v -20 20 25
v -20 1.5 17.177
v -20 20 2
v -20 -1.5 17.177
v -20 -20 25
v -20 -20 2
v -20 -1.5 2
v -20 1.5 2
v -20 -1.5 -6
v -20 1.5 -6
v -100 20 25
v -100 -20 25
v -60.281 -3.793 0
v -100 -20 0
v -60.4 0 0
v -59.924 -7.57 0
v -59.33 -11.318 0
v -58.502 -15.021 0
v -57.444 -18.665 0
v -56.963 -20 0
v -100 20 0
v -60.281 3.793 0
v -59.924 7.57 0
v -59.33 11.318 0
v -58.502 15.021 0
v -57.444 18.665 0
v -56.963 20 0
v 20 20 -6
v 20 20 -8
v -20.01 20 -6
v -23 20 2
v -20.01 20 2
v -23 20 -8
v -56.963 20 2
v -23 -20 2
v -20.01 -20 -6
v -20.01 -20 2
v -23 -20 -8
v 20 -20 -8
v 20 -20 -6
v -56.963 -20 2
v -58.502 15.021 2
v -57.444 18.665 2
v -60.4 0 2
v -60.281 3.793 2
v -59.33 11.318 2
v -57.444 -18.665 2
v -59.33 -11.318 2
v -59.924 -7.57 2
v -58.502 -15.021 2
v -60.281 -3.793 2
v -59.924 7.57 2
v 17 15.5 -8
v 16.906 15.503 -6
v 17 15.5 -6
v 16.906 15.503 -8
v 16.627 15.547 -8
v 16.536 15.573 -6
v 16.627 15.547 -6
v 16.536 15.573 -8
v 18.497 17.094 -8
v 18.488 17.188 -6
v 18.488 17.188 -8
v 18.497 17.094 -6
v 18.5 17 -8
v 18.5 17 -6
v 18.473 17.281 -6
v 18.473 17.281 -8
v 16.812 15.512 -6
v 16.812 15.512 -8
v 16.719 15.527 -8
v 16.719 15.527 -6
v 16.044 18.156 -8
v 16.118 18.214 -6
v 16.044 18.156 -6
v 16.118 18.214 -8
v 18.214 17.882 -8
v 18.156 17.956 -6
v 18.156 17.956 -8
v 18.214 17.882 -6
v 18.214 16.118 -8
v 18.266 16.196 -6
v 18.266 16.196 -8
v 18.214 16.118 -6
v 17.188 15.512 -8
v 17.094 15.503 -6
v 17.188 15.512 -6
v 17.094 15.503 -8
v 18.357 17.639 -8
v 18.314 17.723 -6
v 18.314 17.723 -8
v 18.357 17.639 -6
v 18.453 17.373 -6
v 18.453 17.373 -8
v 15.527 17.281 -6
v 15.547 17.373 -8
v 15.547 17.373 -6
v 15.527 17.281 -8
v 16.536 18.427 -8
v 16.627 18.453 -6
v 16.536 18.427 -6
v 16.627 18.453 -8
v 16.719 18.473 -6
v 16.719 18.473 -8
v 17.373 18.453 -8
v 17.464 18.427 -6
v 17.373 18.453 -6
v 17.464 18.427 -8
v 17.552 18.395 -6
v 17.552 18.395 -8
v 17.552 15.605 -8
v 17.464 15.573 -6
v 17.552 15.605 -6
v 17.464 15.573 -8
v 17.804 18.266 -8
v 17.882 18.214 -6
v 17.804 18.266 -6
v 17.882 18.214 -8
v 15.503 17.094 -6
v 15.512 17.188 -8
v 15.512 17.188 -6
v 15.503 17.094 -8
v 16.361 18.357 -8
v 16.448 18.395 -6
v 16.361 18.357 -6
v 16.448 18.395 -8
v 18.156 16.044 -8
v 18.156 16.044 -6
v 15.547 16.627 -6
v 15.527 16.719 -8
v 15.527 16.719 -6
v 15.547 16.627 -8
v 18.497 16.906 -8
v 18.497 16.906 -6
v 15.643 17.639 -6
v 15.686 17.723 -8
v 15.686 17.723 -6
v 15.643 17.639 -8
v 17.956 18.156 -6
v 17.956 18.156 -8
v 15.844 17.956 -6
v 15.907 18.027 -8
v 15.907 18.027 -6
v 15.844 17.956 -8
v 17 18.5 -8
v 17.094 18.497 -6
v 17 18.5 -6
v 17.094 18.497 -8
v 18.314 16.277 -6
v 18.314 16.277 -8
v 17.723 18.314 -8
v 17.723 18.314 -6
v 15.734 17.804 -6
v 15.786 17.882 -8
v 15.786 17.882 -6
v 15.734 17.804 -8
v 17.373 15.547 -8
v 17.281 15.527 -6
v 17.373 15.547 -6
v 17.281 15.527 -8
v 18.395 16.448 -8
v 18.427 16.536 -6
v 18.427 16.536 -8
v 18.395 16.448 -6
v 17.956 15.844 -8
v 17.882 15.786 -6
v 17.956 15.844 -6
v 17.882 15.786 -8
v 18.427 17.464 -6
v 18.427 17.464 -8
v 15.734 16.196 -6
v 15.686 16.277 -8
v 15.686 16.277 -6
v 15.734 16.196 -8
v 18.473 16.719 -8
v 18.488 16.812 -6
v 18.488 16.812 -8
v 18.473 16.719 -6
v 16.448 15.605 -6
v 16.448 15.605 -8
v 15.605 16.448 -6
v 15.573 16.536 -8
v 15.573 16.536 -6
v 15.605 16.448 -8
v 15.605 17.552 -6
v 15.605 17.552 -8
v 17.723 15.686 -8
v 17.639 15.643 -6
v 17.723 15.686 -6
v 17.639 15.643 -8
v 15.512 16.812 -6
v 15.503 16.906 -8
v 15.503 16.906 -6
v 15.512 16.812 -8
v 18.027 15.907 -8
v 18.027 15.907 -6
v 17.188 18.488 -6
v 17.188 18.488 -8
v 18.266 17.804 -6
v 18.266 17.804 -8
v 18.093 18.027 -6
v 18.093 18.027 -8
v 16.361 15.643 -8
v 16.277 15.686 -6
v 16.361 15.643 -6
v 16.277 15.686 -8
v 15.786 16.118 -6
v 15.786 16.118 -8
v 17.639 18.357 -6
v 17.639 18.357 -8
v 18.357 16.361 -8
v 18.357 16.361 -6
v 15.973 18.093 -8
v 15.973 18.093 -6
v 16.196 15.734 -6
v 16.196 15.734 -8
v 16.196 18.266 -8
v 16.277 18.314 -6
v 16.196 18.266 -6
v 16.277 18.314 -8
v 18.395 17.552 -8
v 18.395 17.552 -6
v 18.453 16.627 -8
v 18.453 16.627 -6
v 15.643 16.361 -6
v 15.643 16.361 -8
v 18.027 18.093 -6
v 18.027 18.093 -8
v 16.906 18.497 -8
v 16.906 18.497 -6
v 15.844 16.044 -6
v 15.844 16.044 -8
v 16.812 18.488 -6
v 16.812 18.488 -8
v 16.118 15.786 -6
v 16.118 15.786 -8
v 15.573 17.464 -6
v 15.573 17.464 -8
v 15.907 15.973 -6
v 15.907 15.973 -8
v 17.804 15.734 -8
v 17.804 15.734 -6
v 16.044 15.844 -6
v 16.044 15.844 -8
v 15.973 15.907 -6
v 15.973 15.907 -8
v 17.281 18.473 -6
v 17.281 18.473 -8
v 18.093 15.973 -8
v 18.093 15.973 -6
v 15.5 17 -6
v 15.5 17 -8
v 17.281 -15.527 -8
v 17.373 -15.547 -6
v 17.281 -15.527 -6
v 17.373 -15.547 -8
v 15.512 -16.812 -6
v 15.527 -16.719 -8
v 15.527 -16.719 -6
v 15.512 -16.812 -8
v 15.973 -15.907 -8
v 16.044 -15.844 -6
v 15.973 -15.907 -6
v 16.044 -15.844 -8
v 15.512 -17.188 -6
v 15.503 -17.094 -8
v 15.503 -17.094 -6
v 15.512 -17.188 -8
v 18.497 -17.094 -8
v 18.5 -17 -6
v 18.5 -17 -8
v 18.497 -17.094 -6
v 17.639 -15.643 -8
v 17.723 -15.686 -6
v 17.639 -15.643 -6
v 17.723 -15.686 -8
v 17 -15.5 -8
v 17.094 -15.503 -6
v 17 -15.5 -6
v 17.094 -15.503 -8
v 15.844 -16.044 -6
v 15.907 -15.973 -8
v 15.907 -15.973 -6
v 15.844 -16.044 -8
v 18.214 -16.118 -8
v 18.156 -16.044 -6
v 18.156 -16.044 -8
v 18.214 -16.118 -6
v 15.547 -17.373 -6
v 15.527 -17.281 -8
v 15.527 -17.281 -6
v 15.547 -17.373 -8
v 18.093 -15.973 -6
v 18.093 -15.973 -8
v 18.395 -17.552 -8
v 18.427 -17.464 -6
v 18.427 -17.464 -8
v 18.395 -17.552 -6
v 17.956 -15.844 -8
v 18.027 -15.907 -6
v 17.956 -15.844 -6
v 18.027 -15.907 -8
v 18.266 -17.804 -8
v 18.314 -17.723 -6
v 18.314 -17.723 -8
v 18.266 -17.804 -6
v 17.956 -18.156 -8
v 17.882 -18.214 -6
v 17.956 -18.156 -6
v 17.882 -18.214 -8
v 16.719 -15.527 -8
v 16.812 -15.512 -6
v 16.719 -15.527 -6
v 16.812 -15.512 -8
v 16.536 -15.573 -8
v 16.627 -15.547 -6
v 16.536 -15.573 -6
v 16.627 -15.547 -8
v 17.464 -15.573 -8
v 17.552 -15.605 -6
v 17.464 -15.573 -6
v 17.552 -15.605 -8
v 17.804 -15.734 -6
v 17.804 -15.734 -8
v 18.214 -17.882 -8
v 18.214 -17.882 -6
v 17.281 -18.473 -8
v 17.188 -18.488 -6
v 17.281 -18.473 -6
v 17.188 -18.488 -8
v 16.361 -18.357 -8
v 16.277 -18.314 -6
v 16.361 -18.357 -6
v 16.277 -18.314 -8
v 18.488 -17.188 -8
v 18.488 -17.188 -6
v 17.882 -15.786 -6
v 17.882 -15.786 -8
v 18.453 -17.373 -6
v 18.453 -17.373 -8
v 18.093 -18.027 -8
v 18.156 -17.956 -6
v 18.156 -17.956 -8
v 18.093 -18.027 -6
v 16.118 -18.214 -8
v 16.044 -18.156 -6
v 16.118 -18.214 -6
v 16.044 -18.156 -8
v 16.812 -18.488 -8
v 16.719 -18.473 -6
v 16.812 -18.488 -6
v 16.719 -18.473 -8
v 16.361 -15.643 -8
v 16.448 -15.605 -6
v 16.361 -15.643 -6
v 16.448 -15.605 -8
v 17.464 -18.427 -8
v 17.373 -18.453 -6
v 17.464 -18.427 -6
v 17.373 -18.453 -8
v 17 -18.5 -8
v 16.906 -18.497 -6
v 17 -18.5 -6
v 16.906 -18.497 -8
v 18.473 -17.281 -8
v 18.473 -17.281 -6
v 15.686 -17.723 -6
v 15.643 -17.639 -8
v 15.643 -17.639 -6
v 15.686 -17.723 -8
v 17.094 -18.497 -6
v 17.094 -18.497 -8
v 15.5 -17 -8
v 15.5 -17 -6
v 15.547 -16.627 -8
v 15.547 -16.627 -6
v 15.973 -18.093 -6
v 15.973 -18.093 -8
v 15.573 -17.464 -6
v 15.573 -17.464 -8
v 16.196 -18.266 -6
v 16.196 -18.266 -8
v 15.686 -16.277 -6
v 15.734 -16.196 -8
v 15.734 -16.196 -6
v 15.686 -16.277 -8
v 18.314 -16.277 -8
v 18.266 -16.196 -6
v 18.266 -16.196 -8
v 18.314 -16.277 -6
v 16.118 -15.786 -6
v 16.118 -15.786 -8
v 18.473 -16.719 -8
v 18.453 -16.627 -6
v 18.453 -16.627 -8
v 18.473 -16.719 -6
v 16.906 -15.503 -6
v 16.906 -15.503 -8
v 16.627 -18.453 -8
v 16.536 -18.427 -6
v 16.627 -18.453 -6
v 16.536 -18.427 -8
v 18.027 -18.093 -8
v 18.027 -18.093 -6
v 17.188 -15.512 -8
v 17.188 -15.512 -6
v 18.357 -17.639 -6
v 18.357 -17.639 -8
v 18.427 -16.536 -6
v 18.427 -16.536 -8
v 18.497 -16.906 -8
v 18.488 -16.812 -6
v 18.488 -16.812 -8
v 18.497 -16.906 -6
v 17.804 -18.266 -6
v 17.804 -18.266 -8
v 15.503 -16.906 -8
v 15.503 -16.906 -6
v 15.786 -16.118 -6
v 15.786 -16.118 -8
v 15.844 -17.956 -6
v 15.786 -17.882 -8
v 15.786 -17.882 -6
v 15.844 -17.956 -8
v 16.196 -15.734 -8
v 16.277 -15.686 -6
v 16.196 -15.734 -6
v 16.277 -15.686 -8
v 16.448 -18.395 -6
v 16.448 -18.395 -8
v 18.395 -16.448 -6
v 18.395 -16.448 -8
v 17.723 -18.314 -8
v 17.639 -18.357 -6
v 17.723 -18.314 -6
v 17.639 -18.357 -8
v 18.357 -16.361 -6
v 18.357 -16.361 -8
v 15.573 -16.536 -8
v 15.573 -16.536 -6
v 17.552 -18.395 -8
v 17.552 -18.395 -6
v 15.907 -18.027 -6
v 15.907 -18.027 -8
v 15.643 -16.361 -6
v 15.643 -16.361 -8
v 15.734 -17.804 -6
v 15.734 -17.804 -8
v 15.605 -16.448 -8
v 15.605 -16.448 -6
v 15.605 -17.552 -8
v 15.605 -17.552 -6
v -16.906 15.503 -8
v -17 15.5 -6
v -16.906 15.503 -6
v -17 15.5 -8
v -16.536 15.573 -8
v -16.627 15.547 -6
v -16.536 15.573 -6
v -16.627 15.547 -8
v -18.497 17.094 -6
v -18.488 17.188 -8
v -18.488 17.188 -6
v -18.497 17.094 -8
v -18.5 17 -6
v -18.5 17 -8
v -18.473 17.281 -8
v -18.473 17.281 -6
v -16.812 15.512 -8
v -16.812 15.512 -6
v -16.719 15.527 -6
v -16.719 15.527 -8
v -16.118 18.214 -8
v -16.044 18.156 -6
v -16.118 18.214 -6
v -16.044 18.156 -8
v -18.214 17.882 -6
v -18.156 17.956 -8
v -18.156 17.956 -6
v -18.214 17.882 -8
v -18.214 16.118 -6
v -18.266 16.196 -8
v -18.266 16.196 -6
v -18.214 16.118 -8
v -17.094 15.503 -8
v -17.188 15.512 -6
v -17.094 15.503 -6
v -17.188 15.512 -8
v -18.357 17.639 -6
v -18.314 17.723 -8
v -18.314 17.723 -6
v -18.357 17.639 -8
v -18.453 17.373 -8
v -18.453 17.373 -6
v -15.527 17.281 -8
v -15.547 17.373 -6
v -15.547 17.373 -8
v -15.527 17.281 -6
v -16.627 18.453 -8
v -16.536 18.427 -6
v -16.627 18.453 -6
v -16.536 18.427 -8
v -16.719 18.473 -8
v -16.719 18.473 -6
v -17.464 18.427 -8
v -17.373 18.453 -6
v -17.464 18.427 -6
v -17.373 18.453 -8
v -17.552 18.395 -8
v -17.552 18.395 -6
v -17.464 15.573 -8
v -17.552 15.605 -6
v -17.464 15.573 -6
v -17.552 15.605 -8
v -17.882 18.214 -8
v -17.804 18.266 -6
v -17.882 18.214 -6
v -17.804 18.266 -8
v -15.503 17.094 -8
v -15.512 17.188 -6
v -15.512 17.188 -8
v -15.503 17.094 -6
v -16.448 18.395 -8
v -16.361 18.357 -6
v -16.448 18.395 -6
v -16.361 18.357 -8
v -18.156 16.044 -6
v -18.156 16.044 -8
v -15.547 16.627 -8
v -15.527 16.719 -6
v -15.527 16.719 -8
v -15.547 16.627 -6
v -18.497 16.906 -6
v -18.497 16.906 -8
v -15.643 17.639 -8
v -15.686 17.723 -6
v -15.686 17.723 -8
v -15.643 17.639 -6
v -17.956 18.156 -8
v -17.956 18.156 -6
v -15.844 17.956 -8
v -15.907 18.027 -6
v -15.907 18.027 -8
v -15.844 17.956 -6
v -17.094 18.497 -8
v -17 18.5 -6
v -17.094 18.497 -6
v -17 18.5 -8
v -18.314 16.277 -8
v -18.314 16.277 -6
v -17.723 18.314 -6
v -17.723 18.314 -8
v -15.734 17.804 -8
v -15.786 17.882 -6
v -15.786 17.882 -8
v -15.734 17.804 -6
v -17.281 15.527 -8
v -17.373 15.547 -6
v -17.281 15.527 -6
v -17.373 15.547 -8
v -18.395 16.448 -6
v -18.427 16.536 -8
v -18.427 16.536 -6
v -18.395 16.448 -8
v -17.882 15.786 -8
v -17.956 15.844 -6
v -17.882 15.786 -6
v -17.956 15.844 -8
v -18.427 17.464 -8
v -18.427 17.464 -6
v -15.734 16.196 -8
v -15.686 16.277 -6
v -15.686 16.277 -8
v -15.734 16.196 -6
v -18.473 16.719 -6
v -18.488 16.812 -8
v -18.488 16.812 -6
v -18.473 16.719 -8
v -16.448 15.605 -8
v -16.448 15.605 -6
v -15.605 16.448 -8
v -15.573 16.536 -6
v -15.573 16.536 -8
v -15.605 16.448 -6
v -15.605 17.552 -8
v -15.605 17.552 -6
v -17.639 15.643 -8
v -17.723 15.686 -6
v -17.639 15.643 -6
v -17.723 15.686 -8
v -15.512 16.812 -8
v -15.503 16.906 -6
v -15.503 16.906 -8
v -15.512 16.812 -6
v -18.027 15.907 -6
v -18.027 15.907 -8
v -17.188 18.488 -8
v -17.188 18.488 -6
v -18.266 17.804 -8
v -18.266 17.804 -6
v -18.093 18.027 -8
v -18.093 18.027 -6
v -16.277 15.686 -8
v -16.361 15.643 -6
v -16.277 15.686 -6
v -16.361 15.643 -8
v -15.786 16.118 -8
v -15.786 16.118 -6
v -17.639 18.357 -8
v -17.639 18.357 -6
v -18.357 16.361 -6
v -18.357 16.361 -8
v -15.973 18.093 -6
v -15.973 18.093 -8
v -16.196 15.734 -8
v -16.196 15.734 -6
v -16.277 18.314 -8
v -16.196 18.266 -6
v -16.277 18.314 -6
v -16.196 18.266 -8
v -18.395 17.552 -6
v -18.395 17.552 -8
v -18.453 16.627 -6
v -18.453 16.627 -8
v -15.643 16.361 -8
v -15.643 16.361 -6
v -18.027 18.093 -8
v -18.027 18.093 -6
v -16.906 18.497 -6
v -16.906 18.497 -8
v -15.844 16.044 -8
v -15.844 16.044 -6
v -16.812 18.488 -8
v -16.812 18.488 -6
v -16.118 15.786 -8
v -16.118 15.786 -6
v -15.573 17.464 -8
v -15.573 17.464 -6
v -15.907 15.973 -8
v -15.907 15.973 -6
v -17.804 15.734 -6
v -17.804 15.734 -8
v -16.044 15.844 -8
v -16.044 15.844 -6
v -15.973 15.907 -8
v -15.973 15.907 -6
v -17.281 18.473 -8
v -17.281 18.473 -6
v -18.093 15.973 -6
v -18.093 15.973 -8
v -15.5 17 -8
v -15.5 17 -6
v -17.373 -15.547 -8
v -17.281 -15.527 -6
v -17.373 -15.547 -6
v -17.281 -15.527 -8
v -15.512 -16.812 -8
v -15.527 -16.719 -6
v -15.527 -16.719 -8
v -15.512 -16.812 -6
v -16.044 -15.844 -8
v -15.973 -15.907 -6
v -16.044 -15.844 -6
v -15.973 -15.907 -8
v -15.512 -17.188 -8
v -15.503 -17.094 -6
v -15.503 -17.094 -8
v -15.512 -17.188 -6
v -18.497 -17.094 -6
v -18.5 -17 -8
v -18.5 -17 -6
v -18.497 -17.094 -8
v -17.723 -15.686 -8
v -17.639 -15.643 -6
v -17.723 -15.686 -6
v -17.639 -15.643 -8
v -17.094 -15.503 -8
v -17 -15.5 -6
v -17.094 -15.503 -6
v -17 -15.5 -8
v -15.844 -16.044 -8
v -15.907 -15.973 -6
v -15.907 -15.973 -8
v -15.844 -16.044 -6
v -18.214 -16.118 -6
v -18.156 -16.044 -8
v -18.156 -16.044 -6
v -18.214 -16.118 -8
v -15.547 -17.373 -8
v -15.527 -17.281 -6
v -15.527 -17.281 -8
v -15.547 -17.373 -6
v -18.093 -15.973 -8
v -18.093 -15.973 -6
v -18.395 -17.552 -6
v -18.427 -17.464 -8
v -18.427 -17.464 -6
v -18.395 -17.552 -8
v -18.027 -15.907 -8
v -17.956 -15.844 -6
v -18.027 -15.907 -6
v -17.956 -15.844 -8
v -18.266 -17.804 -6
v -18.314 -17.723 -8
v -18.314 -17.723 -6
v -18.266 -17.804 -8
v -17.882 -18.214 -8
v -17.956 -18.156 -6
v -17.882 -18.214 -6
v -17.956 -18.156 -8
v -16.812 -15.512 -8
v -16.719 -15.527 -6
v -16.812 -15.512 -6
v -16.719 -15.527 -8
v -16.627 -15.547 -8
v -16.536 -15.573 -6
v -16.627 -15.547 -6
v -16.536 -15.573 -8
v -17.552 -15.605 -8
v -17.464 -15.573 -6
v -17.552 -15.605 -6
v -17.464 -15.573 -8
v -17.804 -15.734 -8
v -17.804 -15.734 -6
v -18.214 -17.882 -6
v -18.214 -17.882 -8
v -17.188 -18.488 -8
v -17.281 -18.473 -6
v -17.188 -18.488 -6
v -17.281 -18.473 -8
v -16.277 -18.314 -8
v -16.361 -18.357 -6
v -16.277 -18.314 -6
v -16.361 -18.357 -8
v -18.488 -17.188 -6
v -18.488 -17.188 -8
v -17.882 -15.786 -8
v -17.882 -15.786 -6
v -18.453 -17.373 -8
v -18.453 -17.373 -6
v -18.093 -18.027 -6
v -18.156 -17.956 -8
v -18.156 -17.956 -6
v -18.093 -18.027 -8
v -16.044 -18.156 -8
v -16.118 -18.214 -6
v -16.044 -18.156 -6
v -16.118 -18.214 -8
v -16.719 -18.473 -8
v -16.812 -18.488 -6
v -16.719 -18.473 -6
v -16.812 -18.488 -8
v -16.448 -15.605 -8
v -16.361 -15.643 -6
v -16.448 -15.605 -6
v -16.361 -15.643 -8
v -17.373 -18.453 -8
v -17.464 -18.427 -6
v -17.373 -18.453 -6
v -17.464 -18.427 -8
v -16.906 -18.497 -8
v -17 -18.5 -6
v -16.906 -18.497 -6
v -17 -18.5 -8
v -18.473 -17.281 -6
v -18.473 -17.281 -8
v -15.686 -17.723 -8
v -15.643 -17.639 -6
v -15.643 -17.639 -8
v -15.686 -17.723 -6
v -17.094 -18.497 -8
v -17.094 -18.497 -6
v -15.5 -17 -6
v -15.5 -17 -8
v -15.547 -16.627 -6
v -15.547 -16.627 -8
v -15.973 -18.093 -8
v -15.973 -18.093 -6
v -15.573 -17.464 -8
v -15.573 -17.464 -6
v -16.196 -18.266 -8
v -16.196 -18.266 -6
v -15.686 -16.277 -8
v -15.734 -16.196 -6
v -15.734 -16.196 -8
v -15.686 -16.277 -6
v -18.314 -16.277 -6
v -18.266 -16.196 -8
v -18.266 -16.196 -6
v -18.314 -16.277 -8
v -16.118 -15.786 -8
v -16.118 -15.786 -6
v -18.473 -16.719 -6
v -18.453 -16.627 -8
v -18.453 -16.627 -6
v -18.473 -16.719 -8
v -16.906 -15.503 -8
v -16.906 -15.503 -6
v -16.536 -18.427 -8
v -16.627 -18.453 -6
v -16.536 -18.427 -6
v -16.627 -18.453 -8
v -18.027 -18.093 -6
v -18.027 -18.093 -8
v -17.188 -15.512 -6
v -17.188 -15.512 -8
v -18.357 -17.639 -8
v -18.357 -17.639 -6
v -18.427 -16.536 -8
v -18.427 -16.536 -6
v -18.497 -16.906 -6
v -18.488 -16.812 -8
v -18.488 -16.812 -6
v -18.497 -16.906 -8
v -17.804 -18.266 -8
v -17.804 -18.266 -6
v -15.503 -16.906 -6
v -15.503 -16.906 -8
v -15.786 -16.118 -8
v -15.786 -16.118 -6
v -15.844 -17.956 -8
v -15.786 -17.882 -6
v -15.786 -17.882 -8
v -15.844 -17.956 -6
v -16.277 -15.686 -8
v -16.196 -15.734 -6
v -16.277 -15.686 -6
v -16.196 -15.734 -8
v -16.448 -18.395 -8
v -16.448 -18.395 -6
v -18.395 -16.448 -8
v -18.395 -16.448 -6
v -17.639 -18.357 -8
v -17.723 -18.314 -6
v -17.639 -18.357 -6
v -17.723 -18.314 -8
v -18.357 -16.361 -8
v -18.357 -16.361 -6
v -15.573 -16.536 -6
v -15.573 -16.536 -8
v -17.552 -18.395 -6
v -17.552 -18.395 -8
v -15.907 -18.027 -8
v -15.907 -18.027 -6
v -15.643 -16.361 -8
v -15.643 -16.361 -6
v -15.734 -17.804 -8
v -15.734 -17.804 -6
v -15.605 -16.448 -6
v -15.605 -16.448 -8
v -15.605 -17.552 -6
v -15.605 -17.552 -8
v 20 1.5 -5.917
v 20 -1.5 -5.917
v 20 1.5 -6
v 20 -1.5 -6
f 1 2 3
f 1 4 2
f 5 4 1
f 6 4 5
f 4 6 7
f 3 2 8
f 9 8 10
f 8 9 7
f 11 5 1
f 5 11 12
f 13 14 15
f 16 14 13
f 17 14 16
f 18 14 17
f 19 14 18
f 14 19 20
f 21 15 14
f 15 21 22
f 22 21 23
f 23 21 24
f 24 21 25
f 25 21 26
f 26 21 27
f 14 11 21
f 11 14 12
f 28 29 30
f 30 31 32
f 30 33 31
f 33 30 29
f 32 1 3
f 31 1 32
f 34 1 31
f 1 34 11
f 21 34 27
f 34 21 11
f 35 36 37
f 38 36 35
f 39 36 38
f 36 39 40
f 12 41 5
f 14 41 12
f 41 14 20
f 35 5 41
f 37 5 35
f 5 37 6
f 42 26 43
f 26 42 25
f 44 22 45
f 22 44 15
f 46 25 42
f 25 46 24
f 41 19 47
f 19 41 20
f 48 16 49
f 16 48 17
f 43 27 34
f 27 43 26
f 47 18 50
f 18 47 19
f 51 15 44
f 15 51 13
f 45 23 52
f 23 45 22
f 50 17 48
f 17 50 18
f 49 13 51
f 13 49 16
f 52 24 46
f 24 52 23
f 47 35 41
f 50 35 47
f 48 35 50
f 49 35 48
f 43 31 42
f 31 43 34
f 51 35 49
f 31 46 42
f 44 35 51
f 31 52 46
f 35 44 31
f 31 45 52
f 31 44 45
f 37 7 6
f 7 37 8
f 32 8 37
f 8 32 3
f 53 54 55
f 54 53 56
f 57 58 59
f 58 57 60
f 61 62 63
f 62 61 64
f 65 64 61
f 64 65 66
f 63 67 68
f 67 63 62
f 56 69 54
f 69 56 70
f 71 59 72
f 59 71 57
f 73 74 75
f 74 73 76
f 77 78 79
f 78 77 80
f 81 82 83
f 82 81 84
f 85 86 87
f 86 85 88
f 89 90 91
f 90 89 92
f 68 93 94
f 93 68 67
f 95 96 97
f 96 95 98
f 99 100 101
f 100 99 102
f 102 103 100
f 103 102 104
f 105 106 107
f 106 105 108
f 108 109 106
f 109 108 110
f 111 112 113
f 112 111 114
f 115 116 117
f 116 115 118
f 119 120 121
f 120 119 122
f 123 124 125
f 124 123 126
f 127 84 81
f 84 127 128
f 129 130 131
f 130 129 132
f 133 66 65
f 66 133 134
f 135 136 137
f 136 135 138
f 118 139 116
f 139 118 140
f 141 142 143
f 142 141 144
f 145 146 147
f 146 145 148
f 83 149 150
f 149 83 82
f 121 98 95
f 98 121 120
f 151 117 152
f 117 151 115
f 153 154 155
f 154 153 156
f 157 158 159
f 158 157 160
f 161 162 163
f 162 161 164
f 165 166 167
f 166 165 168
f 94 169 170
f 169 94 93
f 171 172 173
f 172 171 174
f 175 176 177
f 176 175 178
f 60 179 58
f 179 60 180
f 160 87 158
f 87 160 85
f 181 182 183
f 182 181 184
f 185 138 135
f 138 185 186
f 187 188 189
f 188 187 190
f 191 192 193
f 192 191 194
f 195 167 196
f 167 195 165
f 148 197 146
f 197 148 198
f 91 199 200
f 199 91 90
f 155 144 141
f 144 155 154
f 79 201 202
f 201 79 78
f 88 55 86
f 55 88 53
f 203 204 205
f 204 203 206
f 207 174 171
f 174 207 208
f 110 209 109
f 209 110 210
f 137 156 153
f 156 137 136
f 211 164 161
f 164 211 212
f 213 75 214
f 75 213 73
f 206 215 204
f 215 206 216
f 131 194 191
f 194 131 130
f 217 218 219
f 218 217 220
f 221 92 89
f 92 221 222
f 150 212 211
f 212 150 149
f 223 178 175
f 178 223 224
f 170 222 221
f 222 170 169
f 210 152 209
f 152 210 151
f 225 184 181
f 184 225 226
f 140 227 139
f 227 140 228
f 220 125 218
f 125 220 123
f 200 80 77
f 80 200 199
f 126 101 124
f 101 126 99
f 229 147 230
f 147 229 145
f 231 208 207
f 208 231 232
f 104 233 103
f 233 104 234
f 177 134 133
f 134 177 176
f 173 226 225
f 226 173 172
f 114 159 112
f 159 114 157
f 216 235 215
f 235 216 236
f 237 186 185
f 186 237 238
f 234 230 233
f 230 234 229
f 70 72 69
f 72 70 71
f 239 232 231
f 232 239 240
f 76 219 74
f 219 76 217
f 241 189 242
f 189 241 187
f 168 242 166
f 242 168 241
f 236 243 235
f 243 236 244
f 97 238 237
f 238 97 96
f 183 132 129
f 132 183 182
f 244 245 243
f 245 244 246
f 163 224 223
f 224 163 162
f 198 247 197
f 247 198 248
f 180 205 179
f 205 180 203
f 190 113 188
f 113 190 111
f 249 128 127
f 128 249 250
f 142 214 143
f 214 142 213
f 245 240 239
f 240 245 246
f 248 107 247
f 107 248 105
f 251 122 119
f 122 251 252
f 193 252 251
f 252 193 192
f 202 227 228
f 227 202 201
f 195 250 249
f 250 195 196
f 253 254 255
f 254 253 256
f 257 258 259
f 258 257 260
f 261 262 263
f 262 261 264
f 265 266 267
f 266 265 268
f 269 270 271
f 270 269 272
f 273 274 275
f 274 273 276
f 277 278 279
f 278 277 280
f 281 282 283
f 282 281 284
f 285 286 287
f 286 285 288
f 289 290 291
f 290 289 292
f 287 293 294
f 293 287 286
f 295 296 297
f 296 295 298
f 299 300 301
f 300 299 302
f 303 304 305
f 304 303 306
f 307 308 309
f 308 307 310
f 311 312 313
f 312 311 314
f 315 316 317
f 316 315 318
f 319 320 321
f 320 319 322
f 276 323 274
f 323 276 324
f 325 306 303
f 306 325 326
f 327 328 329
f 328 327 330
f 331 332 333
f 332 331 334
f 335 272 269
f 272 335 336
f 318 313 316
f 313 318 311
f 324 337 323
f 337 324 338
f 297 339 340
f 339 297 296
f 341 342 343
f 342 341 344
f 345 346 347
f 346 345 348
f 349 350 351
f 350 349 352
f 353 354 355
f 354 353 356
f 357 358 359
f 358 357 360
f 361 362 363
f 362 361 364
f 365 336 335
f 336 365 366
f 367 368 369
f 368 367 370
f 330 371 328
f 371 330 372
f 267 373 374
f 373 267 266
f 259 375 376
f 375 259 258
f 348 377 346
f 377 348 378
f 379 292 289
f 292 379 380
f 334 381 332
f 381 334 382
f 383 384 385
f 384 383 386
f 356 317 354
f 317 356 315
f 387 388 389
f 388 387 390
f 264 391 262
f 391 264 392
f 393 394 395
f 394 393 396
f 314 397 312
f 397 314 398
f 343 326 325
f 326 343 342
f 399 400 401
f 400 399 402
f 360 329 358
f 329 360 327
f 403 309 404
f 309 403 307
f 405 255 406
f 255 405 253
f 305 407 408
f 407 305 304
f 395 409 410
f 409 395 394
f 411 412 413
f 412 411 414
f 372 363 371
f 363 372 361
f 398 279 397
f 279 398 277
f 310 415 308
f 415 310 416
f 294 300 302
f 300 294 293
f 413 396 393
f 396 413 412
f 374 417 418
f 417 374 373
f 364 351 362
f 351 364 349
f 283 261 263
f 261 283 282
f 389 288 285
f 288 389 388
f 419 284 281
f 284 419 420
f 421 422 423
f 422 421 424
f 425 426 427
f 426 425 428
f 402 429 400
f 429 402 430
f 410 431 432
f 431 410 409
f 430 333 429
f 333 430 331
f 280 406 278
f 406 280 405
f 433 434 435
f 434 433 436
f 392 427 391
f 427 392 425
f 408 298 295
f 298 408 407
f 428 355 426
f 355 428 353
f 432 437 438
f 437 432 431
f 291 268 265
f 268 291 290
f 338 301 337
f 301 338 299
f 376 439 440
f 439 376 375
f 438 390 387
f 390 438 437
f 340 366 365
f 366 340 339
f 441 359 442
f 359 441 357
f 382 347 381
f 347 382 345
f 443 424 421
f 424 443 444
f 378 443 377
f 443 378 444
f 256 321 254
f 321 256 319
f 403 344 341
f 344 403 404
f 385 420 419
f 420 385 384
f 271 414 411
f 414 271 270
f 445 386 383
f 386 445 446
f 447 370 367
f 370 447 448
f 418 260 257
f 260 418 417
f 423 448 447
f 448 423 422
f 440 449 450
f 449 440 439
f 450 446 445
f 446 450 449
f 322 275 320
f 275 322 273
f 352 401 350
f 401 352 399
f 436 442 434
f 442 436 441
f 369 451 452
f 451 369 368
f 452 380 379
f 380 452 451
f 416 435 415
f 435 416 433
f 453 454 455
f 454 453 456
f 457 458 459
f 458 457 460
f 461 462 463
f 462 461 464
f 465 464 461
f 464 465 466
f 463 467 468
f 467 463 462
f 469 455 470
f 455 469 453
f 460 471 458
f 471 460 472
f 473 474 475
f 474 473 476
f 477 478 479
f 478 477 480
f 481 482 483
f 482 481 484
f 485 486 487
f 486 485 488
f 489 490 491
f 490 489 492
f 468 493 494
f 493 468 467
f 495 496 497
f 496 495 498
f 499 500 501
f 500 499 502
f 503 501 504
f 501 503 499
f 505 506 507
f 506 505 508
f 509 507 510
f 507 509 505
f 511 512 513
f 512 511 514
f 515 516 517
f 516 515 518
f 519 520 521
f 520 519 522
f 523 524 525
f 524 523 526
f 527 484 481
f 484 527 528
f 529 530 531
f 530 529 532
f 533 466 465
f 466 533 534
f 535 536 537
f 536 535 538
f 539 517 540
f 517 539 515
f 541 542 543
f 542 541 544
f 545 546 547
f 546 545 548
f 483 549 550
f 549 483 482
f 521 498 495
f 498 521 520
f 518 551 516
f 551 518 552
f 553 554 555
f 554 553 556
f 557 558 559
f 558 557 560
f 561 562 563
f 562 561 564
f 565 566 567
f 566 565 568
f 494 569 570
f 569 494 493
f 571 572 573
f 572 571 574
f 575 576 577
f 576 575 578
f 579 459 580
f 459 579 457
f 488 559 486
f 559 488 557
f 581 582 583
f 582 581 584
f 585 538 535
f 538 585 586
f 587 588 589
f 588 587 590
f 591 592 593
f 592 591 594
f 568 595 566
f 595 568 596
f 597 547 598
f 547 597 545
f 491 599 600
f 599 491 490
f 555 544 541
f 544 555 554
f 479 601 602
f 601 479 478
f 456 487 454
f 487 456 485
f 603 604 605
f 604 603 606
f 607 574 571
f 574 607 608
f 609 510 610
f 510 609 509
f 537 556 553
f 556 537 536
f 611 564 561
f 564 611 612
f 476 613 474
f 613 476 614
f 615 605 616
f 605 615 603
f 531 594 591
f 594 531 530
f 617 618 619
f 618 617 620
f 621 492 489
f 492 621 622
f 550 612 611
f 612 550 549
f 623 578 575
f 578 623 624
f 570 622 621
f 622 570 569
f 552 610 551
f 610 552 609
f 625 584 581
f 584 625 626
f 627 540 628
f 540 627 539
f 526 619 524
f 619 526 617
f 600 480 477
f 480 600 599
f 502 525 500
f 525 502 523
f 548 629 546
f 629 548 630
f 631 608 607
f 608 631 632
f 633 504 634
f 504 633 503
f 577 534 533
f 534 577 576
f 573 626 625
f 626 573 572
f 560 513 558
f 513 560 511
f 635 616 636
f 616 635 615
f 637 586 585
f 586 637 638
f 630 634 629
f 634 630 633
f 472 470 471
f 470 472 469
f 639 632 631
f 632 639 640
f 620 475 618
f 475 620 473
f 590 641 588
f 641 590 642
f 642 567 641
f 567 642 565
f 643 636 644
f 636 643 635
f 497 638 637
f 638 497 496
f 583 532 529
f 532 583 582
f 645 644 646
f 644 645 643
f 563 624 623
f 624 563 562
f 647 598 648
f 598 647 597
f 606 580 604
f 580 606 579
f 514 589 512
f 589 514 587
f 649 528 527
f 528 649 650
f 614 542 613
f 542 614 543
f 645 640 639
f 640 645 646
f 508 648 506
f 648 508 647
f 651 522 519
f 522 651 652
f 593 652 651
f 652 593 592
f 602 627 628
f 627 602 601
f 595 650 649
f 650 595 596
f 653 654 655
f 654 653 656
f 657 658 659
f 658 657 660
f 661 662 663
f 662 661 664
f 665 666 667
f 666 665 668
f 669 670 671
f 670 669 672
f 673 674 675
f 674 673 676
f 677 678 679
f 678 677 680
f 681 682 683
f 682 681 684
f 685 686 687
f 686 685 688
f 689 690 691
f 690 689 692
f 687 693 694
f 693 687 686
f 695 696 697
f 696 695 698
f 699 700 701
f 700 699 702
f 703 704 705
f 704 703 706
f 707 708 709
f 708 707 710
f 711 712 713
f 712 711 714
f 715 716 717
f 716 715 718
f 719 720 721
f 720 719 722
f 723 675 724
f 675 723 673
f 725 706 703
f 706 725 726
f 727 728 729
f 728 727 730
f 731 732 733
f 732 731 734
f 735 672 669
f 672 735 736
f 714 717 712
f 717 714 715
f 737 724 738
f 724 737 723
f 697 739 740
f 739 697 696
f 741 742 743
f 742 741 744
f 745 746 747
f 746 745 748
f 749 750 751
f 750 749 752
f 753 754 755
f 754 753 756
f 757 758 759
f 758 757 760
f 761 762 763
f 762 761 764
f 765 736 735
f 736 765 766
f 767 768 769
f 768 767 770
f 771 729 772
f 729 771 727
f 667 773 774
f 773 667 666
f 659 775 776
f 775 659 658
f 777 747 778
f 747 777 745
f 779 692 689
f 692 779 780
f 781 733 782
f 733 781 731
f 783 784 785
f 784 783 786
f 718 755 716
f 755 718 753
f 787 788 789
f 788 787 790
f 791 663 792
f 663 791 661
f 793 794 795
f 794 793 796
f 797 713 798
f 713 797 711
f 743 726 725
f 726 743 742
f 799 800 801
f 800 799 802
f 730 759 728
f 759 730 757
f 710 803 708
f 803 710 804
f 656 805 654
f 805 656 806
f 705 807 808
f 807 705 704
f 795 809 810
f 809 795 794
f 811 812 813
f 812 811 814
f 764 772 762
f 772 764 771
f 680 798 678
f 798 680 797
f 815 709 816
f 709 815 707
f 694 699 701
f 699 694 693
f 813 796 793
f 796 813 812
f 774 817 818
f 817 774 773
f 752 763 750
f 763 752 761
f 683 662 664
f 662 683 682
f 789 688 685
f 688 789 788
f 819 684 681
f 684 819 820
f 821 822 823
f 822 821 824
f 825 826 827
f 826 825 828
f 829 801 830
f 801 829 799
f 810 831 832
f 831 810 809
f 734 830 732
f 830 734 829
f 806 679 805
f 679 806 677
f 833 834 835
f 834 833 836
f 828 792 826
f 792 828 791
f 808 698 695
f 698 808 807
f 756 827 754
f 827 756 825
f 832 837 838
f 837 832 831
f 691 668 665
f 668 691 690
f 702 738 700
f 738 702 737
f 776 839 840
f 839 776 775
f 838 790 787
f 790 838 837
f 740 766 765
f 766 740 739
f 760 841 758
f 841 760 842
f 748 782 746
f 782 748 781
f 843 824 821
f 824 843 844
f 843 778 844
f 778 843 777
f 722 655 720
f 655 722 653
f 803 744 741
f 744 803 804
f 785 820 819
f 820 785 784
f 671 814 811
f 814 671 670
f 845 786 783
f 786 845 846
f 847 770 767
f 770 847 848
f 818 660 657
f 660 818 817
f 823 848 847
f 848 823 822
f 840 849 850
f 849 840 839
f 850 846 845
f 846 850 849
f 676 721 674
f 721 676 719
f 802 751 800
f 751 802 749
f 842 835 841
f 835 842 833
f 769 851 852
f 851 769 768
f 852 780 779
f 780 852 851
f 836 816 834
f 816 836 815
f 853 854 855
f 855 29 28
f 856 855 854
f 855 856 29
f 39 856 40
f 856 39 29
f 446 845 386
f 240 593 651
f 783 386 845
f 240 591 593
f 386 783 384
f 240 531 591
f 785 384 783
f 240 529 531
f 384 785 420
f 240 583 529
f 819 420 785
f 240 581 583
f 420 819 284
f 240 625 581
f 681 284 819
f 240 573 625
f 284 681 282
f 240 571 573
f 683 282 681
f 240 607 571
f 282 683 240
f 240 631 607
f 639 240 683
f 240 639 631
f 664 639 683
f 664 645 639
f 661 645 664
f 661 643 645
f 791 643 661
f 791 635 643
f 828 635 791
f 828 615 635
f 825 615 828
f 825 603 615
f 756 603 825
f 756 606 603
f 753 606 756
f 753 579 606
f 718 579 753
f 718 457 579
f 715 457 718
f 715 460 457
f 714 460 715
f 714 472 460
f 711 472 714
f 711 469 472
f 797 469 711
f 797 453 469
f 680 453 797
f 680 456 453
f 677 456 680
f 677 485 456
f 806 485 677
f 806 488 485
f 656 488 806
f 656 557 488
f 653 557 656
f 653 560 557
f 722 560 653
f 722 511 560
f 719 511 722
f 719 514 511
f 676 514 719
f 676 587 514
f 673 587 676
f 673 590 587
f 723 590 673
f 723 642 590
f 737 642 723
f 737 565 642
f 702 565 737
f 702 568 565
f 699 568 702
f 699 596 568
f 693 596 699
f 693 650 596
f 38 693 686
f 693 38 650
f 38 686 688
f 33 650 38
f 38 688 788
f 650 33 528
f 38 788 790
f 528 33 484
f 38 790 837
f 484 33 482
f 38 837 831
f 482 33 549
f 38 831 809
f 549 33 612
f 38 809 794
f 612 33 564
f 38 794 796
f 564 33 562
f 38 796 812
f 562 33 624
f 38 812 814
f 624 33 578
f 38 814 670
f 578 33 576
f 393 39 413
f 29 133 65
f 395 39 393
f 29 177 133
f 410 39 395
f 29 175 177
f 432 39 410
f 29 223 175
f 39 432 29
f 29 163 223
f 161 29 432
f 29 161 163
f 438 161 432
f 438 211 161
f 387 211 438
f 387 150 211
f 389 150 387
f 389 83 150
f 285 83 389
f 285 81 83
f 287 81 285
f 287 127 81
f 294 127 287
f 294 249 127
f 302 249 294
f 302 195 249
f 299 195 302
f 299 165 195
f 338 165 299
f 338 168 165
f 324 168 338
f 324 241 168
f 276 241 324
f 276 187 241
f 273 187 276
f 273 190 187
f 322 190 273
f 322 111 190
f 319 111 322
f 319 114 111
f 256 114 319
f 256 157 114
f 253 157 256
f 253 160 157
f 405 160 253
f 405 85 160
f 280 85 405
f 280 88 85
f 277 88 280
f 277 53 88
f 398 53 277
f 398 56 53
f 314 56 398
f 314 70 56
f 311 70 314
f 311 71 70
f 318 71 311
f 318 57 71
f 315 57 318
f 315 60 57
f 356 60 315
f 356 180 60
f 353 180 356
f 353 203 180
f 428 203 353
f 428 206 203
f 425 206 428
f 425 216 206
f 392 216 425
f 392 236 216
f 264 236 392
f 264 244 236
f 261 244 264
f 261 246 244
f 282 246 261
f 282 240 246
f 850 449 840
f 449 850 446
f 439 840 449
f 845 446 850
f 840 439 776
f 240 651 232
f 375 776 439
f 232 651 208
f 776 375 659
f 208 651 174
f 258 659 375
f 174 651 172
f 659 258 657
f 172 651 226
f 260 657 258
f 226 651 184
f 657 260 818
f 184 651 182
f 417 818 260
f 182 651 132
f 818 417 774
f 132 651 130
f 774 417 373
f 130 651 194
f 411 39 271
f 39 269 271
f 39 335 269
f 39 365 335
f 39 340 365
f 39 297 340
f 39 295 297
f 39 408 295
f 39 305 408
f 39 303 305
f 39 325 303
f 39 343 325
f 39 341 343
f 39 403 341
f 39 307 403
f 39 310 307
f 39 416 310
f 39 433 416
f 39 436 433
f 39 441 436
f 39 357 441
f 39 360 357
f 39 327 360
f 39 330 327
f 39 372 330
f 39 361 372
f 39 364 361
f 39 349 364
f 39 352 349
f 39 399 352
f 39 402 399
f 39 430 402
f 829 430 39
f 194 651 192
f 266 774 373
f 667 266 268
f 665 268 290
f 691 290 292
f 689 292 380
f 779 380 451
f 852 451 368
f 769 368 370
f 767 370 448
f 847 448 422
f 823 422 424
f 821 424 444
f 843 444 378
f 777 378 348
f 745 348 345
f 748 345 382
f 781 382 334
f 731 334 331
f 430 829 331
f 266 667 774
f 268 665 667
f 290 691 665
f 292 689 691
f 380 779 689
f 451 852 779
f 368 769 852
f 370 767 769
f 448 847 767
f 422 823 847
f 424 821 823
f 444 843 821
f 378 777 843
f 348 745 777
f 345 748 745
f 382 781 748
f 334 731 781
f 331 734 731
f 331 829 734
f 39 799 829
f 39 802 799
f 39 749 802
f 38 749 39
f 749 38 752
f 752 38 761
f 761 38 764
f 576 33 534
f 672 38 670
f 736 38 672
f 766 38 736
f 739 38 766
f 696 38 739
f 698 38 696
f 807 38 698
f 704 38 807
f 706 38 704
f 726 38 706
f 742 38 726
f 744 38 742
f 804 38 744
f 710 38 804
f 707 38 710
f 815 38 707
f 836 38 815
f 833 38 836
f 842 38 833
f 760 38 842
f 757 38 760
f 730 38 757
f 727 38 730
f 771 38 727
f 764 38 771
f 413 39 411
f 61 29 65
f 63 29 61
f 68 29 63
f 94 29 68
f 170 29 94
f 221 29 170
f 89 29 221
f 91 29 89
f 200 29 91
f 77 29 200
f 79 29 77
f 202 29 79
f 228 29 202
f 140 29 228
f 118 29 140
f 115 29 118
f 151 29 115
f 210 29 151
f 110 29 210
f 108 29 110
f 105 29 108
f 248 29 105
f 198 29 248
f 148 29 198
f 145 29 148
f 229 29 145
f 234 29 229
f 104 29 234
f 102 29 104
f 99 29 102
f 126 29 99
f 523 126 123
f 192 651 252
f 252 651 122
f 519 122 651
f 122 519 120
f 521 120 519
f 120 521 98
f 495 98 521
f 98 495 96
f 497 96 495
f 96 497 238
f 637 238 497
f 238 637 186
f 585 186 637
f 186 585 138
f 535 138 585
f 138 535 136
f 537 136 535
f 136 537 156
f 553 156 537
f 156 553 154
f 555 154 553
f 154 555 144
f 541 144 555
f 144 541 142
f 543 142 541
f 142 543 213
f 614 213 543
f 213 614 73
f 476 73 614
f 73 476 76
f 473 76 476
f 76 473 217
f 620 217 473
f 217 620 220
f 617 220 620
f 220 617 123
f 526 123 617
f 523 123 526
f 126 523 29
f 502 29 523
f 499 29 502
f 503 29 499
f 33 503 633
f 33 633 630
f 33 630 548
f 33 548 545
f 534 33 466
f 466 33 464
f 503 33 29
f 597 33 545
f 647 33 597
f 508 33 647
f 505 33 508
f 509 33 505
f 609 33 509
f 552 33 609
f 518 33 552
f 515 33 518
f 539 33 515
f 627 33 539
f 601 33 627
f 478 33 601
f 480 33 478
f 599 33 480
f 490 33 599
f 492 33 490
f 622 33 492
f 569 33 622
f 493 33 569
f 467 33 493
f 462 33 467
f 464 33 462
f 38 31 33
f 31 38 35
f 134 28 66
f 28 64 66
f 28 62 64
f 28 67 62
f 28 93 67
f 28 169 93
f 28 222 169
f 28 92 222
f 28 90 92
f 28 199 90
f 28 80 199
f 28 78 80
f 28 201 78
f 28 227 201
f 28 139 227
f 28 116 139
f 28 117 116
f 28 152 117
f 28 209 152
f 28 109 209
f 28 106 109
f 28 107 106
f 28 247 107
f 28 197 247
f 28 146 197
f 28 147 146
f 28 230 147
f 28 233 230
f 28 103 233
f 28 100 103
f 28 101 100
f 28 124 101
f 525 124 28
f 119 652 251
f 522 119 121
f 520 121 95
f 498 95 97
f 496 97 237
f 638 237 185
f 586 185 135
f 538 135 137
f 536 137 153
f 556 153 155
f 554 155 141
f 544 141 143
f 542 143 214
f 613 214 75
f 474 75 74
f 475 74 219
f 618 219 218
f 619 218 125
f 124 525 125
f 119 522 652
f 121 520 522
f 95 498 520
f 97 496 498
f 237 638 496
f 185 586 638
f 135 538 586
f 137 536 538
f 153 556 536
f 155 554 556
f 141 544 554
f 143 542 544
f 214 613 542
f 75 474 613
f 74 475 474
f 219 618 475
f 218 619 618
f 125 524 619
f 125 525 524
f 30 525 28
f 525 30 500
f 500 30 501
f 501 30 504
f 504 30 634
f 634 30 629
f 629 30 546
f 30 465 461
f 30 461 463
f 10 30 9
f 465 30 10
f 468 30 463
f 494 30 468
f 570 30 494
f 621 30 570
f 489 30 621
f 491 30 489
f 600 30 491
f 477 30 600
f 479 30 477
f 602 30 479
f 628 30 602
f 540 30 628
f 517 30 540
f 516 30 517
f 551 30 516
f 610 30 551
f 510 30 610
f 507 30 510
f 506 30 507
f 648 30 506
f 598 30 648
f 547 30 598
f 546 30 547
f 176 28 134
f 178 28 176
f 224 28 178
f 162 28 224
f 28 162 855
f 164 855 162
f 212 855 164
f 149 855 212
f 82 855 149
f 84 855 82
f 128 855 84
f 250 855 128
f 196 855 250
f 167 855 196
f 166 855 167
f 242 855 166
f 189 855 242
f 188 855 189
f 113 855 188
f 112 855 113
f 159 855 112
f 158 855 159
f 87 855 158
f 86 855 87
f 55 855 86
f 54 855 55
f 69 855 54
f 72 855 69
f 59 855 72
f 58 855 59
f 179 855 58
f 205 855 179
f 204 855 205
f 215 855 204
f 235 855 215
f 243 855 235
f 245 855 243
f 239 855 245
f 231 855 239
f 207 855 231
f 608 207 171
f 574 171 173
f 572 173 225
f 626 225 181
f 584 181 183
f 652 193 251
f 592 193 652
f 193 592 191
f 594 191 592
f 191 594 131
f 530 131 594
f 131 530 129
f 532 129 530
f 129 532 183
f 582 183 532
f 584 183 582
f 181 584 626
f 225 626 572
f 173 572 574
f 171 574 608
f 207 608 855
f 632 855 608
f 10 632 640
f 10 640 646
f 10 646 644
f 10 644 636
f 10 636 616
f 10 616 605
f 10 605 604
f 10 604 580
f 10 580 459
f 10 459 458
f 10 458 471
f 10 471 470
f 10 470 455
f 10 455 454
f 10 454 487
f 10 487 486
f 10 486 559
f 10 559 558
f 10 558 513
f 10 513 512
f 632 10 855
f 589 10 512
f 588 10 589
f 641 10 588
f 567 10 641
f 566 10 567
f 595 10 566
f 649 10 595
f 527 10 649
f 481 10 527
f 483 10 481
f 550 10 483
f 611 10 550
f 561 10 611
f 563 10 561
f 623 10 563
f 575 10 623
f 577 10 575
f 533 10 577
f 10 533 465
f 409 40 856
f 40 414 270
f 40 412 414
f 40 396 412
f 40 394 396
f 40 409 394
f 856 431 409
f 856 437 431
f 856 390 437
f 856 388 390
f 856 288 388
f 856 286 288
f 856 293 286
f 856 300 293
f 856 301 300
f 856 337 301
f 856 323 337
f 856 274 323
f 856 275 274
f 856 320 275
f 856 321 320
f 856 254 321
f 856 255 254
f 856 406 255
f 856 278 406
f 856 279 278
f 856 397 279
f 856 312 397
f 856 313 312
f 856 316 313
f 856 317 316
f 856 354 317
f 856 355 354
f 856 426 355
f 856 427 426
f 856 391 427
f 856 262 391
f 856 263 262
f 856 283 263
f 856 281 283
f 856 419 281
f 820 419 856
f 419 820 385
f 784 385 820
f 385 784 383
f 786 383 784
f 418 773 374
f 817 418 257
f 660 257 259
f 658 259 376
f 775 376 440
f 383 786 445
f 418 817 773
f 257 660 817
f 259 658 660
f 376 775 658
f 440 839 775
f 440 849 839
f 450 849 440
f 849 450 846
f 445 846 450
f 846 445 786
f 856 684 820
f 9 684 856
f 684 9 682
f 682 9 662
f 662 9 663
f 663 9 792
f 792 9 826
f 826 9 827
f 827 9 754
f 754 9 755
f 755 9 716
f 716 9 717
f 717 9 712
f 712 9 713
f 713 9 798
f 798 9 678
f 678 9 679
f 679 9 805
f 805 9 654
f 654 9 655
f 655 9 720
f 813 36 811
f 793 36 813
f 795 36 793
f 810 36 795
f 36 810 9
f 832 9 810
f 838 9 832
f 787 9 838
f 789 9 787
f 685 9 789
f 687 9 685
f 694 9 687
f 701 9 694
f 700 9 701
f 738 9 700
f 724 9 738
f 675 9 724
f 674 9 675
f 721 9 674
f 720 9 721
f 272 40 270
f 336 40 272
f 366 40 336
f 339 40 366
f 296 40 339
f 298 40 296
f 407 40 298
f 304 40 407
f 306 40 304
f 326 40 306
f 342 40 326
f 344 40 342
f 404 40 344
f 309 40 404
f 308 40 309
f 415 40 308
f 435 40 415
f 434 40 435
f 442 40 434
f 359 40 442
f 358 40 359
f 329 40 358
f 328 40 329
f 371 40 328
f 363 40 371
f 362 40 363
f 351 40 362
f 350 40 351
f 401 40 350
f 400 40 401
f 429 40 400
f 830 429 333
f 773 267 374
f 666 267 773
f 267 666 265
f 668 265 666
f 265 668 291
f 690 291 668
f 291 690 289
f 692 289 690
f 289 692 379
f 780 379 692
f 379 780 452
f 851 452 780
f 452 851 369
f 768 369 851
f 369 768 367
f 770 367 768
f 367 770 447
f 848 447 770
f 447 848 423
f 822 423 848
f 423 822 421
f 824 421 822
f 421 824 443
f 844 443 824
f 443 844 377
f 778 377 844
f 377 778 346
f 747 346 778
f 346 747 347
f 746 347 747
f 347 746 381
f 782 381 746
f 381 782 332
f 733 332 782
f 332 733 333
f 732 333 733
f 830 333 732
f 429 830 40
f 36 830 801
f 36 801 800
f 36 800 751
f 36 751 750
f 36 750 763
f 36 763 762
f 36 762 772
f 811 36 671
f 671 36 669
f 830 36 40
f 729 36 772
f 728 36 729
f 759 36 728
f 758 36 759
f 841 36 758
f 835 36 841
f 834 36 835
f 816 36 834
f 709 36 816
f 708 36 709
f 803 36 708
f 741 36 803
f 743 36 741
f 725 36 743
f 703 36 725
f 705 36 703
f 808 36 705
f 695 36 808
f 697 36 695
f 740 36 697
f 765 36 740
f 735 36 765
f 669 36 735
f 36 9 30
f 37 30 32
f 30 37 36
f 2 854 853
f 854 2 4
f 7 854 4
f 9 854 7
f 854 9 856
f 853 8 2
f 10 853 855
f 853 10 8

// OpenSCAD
//include<params.scad>

module camera_base(){
    difference(){
        translate([-200/2+(100-40/2)/2,0,25/2])
        cube([100-40/2,40,25],center=true);
        translate([0,0,-0.01])
        cylinder(r=120/2+0.4,h=2.01);
    }
    difference(){
        camera_bolt_r = 3.0/2;
        union(){
            translate([-3/2,0,(25+8)/2-8])
            cube([40+3,40,25+8],center=true);
        }
        translate([0,0,100/2-6])
        cube([40.02,40.02,100],center=true);
        //camera : outline 38x38, hole 34x34
        for(i=[0:1]){
            mirror([i,0])
                for(j=[0:1]){
                    mirror([0,j])
                        translate([34/2, 34/2])
                            cylinder(r=camera_bolt_r,h=100,center=true);
                }
        }
    }
    intersection(){
        translate([-10,0,-14])
        rotate([90,0,0])
        cylinder(r=(35-2)*4/3,h=3,center=true,$fn=3);
        translate([0,0,100/2-6.01])
        cube([40,40,100],center=true);
    }
}
$fn=100;
camera_base();
//end of code
